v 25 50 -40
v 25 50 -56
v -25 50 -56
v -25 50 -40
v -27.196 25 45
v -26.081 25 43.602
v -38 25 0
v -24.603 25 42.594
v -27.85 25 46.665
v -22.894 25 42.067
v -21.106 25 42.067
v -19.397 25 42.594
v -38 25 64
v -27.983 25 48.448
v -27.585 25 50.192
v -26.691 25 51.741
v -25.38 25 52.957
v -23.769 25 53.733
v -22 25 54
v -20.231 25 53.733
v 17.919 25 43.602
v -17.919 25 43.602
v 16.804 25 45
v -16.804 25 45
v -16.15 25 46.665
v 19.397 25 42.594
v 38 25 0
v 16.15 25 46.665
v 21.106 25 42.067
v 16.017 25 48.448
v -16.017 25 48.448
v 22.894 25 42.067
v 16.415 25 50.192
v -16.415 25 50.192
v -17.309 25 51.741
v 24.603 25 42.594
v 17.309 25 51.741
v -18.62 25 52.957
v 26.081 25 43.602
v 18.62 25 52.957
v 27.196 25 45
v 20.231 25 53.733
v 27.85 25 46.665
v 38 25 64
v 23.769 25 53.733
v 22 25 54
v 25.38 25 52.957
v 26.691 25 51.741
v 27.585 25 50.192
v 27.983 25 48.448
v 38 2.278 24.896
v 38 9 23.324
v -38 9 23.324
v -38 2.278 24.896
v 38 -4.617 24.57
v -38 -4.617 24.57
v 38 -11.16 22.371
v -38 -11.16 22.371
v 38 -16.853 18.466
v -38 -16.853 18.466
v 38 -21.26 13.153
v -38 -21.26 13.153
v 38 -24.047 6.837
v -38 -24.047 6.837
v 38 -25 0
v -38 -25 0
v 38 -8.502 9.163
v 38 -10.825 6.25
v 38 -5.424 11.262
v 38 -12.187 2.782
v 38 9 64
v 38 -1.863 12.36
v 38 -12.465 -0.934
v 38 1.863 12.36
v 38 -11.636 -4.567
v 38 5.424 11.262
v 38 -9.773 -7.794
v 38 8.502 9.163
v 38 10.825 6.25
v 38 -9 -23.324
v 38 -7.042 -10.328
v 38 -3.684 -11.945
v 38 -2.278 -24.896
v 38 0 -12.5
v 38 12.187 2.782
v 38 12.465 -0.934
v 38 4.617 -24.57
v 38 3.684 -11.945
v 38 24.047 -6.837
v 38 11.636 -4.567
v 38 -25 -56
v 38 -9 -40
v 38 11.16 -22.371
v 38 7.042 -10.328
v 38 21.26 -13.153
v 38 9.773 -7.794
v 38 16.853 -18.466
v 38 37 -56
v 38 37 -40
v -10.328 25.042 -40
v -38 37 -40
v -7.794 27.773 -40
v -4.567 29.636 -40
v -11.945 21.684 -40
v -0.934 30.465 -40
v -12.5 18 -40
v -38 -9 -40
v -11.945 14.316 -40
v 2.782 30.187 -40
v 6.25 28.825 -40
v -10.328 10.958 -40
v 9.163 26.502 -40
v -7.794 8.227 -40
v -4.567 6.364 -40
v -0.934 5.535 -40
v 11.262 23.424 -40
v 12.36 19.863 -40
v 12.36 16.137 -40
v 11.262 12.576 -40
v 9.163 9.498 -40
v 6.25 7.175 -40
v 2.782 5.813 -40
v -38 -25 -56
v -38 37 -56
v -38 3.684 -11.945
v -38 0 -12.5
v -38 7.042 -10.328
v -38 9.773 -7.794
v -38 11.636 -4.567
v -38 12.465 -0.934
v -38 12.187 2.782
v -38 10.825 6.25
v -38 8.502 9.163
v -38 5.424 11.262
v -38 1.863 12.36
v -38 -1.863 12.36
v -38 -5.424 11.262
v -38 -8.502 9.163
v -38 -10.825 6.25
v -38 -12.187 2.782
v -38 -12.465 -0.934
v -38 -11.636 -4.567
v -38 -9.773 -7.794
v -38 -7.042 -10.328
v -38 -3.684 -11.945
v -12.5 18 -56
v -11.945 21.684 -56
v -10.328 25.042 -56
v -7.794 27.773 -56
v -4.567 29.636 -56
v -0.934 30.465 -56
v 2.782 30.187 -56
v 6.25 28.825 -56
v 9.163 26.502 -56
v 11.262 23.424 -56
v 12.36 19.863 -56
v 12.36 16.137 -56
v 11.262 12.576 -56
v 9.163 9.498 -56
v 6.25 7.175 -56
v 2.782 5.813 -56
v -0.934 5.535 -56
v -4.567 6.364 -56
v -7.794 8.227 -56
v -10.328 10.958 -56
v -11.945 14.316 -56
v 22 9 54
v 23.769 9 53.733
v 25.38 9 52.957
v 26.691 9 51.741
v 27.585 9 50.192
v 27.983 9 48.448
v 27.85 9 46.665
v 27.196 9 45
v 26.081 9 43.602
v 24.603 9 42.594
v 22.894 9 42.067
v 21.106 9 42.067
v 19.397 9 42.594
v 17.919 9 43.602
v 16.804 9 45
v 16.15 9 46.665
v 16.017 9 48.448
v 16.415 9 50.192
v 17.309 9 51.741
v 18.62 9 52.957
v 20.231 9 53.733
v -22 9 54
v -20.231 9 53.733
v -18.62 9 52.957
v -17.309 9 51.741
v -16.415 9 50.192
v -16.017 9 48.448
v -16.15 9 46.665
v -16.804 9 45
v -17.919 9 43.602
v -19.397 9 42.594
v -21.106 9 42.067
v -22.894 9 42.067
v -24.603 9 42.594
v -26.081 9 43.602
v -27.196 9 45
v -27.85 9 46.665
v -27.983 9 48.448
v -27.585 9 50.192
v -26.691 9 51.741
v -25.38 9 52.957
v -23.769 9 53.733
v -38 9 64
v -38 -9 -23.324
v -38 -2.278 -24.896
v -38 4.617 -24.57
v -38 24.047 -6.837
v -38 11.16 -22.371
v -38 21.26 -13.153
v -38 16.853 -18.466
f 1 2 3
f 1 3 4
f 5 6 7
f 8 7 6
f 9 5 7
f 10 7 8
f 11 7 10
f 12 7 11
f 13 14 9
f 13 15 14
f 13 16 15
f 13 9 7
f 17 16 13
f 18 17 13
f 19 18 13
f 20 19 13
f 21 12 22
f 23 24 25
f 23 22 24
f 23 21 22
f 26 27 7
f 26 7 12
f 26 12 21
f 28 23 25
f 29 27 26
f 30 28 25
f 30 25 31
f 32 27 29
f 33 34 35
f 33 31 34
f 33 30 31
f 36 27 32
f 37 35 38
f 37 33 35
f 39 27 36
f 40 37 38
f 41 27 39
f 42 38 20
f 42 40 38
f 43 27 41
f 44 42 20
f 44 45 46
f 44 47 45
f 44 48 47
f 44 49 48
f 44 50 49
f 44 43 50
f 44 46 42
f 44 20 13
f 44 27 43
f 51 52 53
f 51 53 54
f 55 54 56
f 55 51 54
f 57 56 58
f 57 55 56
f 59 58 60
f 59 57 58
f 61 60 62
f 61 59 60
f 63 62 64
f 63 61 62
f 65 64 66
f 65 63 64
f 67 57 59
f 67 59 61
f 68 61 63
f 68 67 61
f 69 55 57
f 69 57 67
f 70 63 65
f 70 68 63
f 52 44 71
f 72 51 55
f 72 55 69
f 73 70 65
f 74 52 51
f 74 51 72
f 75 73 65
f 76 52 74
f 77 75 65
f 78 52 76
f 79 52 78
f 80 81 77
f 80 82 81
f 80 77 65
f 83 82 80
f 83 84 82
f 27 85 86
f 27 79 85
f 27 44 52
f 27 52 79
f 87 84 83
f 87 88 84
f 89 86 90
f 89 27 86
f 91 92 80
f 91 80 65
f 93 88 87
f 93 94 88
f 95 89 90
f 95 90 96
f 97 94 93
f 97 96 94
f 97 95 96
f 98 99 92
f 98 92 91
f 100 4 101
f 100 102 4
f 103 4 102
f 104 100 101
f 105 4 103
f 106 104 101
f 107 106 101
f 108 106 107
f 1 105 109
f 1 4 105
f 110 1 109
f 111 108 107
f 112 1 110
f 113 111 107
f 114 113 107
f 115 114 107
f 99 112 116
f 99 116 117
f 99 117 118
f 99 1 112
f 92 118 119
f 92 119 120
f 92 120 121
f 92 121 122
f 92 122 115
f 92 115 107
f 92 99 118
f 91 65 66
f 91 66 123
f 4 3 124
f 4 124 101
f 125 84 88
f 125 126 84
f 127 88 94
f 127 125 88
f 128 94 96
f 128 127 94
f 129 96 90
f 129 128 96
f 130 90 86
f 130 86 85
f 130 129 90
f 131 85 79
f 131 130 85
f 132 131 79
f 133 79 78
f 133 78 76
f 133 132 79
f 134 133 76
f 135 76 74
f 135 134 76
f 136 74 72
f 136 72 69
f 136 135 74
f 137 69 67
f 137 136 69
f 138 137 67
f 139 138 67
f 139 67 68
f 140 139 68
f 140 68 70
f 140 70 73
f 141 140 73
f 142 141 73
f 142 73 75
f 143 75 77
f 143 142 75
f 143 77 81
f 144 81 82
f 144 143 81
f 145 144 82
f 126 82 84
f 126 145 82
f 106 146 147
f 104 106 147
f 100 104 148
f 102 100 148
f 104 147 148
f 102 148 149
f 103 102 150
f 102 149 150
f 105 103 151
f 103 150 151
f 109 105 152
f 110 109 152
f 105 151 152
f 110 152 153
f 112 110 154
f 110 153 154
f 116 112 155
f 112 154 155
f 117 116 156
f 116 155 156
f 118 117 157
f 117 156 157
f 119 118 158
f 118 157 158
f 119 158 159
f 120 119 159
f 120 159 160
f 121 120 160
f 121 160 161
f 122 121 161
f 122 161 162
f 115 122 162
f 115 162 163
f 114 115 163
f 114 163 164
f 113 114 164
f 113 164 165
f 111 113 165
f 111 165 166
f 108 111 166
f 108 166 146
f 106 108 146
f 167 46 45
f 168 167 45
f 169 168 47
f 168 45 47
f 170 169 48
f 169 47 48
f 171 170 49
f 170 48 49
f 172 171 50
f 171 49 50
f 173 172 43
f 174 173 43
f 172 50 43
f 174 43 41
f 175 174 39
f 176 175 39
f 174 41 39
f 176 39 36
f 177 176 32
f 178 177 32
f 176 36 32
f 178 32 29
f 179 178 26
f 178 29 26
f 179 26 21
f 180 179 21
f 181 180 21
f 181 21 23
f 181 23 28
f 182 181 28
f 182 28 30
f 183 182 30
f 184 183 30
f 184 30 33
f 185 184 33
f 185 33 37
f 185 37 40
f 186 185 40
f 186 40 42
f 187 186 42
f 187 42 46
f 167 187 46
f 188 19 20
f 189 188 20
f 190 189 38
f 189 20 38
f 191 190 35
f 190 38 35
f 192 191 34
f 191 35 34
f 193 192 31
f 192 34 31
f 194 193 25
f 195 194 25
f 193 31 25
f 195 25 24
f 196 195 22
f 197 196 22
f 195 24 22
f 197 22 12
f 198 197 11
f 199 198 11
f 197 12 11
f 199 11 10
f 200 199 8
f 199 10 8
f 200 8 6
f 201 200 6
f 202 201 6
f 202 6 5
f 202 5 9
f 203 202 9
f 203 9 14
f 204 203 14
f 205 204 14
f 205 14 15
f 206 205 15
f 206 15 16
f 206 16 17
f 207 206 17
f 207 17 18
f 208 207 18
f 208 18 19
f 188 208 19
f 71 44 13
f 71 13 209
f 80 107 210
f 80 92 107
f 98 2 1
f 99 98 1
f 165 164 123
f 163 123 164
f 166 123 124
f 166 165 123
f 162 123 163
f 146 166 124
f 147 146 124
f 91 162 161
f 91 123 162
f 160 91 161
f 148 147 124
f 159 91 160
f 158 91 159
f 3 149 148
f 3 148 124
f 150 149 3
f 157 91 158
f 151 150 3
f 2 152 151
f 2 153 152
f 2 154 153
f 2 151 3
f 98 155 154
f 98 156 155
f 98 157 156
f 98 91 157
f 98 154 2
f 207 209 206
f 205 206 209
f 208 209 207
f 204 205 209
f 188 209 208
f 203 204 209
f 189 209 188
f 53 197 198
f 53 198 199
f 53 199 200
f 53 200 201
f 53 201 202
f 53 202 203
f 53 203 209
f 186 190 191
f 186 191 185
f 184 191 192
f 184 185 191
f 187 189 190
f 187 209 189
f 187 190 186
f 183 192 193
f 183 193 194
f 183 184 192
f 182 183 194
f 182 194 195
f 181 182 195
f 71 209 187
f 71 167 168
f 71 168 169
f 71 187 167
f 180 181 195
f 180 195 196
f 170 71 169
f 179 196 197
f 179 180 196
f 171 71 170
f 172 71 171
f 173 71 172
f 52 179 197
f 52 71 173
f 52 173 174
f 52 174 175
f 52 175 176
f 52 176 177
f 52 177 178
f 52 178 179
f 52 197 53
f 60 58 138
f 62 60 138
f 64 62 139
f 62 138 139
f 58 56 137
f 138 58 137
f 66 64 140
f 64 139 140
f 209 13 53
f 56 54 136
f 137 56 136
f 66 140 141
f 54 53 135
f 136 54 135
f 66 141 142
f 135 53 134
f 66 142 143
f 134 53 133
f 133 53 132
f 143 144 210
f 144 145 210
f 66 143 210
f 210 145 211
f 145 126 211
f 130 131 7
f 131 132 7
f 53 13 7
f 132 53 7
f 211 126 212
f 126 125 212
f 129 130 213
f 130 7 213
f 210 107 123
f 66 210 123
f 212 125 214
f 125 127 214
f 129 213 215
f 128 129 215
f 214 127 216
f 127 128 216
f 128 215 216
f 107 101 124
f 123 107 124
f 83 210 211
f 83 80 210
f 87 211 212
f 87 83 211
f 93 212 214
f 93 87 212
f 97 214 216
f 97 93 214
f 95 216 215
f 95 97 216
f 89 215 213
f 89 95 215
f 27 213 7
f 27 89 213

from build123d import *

# Parameters (mm, degrees)
SKETCH1_R           = 12.5
BOSS_EXTRUDE1_DEPTH = 38
SKETCH2_R           = 6
CUT_EXTRUDE1_DEPTH  = 76
CUT_EXTRUDE2_REACH  = 137.44
SKETCH3_R           = 12.5
CHAMFER1_SIZE       = 13


with BuildPart() as part:
    # Sketch1 → Boss-Extrude1 (new, symmetric)
    with BuildSketch(Plane(origin=(0, 0, 0), x_dir=(0, 0, -1), z_dir=(1, 0, 0))):
        with BuildLine():
            Line((0, 25), (-64, 25))
            Line((-64, 25), (-64, 9))
            Line((-64, 9), (-23.323807579, 9))
            ThreePointArc((-23.323807579, 9), (-20.615528128, -14.142135624), (0, -25))
            Line((0, -25), (56, -25))
            Line((56, -25), (56, 50))
            Line((56, 50), (40, 50))
            Line((40, 50), (40, -9))
            Line((40, -9), (23.323807579, -9))
            ThreePointArc((23.323807579, -9), (20.615528128, 14.142135624), (0, 25))
        make_face()
        Circle(SKETCH1_R, mode=Mode.SUBTRACT)
    extrude(amount=BOSS_EXTRUDE1_DEPTH, both=True)

    # Sketch2 → Cut-Extrude1 (cut)
    with BuildSketch(Plane(origin=(0, 25, 0), x_dir=(1, 0, 0), z_dir=(0, 1, 0))):
        with Locations(Location((-22, -48, 0), (0, 0, 270))):
            Circle(SKETCH2_R)
        with Locations(Location((22, -48, 0), (0, 0, 270))):
            Circle(SKETCH2_R)
    extrude(amount=-CUT_EXTRUDE1_DEPTH, mode=Mode.SUBTRACT)

    # Sketch3 → Cut-Extrude2 (cut, up to next)
    with BuildSketch(Plane(origin=(0, 0, -56), x_dir=(-1, 0, 0), z_dir=(0, 0, -1)), mode=Mode.PRIVATE) as cut_extrude2_sk1:
        with Locations((0, 18)):
            Circle(SKETCH3_R)
    cut_extrude2_tool1 = extrude(cut_extrude2_sk1.sketch, amount=-CUT_EXTRUDE2_REACH, mode=Mode.PRIVATE) & part.part
    add(cut_extrude2_tool1.solids().sort_by_distance((0, 18, -56))[0], mode=Mode.SUBTRACT)

    # Chamfer1
    chamfer1_edges = [part.edges().sort_by_distance(p)[0] for p in [
        (-38, 50, -48),
        (38, 50, -48),
    ]]
    chamfer(chamfer1_edges, length=CHAMFER1_SIZE)


solid = part.part
